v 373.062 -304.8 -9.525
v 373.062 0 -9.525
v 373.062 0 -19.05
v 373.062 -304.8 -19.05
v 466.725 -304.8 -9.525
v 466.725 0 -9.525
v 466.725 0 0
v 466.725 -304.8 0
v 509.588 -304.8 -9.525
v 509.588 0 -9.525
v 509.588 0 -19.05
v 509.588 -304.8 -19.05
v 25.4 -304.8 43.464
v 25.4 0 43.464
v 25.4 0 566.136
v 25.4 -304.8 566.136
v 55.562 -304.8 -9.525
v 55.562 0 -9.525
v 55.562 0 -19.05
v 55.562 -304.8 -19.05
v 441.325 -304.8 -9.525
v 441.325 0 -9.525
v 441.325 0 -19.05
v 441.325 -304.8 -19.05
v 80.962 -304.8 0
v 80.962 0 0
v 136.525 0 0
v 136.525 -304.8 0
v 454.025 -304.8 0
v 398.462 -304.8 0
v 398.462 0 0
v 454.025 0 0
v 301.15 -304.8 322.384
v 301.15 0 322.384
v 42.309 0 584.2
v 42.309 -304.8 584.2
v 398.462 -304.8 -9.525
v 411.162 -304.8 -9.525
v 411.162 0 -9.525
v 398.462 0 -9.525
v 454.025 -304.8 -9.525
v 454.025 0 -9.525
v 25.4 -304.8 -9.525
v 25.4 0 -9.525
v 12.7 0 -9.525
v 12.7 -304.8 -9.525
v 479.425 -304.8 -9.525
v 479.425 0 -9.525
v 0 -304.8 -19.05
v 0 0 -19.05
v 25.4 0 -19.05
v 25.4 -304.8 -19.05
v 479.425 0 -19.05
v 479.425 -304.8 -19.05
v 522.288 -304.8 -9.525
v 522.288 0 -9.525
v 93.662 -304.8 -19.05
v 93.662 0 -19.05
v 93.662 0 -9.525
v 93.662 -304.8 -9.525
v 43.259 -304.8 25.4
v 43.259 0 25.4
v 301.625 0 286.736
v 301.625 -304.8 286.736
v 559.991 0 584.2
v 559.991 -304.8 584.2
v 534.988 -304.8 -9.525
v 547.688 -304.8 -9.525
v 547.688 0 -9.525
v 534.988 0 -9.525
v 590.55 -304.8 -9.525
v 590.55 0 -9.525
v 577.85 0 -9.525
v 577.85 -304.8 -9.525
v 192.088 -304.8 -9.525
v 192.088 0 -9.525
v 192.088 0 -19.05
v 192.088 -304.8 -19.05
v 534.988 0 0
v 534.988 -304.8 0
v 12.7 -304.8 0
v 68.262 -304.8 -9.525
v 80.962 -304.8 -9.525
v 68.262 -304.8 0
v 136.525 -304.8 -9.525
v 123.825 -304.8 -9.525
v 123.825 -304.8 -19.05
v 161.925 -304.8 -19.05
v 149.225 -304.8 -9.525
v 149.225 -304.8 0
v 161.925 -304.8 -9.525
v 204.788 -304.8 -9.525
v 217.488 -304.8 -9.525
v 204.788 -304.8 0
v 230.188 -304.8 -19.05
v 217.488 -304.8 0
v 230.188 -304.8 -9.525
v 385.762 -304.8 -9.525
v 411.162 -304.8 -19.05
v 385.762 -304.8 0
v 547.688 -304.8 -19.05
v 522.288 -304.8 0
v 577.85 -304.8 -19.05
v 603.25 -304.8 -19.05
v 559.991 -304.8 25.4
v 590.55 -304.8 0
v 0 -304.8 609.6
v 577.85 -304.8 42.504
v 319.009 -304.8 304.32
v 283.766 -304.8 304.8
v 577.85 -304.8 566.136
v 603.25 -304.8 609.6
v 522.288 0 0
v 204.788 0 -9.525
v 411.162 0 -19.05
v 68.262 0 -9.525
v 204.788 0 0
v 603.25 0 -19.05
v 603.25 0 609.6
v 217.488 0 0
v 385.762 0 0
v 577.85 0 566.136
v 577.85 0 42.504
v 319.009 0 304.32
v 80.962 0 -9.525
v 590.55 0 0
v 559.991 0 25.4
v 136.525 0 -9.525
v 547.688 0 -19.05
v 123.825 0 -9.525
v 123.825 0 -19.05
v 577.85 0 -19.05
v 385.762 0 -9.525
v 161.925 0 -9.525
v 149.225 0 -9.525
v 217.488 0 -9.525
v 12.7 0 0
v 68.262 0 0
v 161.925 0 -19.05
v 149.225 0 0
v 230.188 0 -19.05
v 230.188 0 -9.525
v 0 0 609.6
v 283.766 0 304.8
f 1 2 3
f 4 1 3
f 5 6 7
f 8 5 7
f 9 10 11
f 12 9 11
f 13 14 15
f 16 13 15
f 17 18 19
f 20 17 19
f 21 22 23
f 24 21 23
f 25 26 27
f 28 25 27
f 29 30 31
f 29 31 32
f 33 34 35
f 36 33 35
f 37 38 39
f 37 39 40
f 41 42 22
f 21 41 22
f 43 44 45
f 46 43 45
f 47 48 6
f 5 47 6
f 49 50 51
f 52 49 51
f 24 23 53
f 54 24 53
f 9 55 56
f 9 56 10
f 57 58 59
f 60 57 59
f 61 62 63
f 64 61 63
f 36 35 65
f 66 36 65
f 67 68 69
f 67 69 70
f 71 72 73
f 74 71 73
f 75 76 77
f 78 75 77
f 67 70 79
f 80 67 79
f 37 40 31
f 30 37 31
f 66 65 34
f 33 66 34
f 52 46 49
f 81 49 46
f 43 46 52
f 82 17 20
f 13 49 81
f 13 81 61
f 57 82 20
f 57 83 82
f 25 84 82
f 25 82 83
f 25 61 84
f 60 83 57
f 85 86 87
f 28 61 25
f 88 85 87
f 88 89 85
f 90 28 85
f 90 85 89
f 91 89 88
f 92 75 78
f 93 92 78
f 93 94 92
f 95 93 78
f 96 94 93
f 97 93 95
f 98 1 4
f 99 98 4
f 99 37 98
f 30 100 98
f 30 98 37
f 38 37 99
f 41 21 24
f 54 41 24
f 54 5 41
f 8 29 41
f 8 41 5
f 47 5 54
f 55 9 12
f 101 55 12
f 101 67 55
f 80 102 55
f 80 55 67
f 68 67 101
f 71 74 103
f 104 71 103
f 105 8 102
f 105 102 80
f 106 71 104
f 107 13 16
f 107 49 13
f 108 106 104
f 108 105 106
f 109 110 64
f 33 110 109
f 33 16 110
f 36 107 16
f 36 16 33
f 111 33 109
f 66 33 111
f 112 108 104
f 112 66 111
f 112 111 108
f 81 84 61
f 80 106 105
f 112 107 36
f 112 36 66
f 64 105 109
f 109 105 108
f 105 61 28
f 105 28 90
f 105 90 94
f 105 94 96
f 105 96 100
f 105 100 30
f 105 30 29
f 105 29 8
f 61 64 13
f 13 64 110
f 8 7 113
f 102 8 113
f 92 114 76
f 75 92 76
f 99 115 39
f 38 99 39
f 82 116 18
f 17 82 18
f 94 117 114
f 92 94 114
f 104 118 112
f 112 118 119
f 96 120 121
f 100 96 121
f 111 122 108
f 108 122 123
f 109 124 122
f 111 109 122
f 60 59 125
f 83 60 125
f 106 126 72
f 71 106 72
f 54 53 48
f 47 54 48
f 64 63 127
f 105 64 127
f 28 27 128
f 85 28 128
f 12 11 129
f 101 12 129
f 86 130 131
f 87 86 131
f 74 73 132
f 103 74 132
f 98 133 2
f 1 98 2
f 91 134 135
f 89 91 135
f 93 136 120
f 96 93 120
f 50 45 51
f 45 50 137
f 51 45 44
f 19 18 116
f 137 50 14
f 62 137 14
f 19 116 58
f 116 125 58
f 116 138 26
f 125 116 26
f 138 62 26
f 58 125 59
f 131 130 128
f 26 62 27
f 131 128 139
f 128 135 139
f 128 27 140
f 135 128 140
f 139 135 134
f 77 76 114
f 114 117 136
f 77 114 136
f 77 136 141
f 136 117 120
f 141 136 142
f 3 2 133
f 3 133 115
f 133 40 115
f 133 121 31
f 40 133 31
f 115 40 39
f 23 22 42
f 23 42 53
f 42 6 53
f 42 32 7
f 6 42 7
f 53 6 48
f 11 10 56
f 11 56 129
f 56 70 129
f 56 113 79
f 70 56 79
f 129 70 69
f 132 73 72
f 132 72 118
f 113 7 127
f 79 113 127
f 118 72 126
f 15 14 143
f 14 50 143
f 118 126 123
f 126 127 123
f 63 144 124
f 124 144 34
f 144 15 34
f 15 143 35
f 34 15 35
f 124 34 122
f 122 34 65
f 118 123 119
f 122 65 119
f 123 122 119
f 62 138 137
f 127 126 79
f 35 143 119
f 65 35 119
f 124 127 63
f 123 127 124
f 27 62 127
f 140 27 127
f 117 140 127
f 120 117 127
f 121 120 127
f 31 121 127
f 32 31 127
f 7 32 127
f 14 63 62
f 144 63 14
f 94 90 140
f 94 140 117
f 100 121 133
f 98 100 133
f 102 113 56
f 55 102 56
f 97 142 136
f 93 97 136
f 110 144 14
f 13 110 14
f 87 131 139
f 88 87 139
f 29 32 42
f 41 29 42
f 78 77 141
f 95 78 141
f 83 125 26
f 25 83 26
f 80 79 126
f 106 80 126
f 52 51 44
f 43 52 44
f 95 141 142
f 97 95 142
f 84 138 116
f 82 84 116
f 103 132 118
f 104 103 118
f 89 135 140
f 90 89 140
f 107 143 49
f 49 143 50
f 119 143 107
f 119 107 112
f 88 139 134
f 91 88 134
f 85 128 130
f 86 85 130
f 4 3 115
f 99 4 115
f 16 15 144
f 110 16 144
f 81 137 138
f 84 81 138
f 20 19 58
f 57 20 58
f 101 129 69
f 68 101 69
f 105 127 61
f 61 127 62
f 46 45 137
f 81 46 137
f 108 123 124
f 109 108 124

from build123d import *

# Parameters (mm, degrees)
F0_W     = 603.25
F0_H     = 609.6
F1_DEPTH = 304.8
F3_DEPTH = 304.8


with BuildPart() as f1:
    # F0 (on Front) → F1 (new body)
    with BuildSketch(Plane.XZ):
        with Locations((301.625, 304.8)):
            Rectangle(F0_W, F0_H)
        Polygon((283.766245, 304.8), (25.4, 43.464028), (25.4, 566.135972), align=None, mode=Mode.SUBTRACT)
        Polygon((559.991245, 25.4), (43.258755, 25.4), (301.625, 286.735972), align=None, mode=Mode.SUBTRACT)
        Polygon((577.85, 566.135972), (577.85, 42.503546), (319.008971, 304.319759), align=None, mode=Mode.SUBTRACT)
        Polygon((301.150216, 322.383787), (42.309187, 584.2), (559.991245, 584.2), align=None, mode=Mode.SUBTRACT)
    extrude(amount=F1_DEPTH)

    # F2 (on Front) → F3 (join)
    with BuildSketch(Plane.XZ):
        Polygon((12.7, 0), (0, 0), (0, -19.05), (25.4, -19.05), (25.4, -9.525), (12.7, -9.525), align=None)
        Polygon((80.9625, 0), (68.2625, 0), (68.2625, -9.525), (55.5625, -9.525), (55.5625, -19.05), (93.6625, -19.05), (93.6625, -9.525), (80.9625, -9.525), align=None)
        Polygon((149.225, 0), (136.525, 0), (136.525, -9.525), (123.825, -9.525), (123.825, -19.05), (161.925, -19.05), (161.925, -9.525), (149.225, -9.525), align=None)
        Polygon((217.4875, 0), (204.7875, 0), (204.7875, -9.525), (192.0875, -9.525), (192.0875, -19.05), (230.1875, -19.05), (230.1875, -9.525), (217.4875, -9.525), align=None)
        Polygon((411.1625, -19.05), (411.1625, -9.525), (398.4625, -9.525), (398.4625, 0), (385.7625, 0), (385.7625, -9.525), (373.0625, -9.525), (373.0625, -19.05), align=None)
        Polygon((479.425, -9.525), (466.725, -9.525), (466.725, 0), (454.025, 0), (454.025, -9.525), (441.325, -9.525), (441.325, -19.05), (479.425, -19.05), align=None)
        Polygon((547.6875, -9.525), (534.9875, -9.525), (534.9875, 0), (522.2875, 0), (522.2875, -9.525), (509.5875, -9.525), (509.5875, -19.05), (547.6875, -19.05), align=None)
        Polygon((603.25, 0), (590.55, 0), (590.55, -9.525), (577.85, -9.525), (577.85, -19.05), (603.25, -19.05), align=None)
    extrude(amount=F3_DEPTH)


solid = f1.part
